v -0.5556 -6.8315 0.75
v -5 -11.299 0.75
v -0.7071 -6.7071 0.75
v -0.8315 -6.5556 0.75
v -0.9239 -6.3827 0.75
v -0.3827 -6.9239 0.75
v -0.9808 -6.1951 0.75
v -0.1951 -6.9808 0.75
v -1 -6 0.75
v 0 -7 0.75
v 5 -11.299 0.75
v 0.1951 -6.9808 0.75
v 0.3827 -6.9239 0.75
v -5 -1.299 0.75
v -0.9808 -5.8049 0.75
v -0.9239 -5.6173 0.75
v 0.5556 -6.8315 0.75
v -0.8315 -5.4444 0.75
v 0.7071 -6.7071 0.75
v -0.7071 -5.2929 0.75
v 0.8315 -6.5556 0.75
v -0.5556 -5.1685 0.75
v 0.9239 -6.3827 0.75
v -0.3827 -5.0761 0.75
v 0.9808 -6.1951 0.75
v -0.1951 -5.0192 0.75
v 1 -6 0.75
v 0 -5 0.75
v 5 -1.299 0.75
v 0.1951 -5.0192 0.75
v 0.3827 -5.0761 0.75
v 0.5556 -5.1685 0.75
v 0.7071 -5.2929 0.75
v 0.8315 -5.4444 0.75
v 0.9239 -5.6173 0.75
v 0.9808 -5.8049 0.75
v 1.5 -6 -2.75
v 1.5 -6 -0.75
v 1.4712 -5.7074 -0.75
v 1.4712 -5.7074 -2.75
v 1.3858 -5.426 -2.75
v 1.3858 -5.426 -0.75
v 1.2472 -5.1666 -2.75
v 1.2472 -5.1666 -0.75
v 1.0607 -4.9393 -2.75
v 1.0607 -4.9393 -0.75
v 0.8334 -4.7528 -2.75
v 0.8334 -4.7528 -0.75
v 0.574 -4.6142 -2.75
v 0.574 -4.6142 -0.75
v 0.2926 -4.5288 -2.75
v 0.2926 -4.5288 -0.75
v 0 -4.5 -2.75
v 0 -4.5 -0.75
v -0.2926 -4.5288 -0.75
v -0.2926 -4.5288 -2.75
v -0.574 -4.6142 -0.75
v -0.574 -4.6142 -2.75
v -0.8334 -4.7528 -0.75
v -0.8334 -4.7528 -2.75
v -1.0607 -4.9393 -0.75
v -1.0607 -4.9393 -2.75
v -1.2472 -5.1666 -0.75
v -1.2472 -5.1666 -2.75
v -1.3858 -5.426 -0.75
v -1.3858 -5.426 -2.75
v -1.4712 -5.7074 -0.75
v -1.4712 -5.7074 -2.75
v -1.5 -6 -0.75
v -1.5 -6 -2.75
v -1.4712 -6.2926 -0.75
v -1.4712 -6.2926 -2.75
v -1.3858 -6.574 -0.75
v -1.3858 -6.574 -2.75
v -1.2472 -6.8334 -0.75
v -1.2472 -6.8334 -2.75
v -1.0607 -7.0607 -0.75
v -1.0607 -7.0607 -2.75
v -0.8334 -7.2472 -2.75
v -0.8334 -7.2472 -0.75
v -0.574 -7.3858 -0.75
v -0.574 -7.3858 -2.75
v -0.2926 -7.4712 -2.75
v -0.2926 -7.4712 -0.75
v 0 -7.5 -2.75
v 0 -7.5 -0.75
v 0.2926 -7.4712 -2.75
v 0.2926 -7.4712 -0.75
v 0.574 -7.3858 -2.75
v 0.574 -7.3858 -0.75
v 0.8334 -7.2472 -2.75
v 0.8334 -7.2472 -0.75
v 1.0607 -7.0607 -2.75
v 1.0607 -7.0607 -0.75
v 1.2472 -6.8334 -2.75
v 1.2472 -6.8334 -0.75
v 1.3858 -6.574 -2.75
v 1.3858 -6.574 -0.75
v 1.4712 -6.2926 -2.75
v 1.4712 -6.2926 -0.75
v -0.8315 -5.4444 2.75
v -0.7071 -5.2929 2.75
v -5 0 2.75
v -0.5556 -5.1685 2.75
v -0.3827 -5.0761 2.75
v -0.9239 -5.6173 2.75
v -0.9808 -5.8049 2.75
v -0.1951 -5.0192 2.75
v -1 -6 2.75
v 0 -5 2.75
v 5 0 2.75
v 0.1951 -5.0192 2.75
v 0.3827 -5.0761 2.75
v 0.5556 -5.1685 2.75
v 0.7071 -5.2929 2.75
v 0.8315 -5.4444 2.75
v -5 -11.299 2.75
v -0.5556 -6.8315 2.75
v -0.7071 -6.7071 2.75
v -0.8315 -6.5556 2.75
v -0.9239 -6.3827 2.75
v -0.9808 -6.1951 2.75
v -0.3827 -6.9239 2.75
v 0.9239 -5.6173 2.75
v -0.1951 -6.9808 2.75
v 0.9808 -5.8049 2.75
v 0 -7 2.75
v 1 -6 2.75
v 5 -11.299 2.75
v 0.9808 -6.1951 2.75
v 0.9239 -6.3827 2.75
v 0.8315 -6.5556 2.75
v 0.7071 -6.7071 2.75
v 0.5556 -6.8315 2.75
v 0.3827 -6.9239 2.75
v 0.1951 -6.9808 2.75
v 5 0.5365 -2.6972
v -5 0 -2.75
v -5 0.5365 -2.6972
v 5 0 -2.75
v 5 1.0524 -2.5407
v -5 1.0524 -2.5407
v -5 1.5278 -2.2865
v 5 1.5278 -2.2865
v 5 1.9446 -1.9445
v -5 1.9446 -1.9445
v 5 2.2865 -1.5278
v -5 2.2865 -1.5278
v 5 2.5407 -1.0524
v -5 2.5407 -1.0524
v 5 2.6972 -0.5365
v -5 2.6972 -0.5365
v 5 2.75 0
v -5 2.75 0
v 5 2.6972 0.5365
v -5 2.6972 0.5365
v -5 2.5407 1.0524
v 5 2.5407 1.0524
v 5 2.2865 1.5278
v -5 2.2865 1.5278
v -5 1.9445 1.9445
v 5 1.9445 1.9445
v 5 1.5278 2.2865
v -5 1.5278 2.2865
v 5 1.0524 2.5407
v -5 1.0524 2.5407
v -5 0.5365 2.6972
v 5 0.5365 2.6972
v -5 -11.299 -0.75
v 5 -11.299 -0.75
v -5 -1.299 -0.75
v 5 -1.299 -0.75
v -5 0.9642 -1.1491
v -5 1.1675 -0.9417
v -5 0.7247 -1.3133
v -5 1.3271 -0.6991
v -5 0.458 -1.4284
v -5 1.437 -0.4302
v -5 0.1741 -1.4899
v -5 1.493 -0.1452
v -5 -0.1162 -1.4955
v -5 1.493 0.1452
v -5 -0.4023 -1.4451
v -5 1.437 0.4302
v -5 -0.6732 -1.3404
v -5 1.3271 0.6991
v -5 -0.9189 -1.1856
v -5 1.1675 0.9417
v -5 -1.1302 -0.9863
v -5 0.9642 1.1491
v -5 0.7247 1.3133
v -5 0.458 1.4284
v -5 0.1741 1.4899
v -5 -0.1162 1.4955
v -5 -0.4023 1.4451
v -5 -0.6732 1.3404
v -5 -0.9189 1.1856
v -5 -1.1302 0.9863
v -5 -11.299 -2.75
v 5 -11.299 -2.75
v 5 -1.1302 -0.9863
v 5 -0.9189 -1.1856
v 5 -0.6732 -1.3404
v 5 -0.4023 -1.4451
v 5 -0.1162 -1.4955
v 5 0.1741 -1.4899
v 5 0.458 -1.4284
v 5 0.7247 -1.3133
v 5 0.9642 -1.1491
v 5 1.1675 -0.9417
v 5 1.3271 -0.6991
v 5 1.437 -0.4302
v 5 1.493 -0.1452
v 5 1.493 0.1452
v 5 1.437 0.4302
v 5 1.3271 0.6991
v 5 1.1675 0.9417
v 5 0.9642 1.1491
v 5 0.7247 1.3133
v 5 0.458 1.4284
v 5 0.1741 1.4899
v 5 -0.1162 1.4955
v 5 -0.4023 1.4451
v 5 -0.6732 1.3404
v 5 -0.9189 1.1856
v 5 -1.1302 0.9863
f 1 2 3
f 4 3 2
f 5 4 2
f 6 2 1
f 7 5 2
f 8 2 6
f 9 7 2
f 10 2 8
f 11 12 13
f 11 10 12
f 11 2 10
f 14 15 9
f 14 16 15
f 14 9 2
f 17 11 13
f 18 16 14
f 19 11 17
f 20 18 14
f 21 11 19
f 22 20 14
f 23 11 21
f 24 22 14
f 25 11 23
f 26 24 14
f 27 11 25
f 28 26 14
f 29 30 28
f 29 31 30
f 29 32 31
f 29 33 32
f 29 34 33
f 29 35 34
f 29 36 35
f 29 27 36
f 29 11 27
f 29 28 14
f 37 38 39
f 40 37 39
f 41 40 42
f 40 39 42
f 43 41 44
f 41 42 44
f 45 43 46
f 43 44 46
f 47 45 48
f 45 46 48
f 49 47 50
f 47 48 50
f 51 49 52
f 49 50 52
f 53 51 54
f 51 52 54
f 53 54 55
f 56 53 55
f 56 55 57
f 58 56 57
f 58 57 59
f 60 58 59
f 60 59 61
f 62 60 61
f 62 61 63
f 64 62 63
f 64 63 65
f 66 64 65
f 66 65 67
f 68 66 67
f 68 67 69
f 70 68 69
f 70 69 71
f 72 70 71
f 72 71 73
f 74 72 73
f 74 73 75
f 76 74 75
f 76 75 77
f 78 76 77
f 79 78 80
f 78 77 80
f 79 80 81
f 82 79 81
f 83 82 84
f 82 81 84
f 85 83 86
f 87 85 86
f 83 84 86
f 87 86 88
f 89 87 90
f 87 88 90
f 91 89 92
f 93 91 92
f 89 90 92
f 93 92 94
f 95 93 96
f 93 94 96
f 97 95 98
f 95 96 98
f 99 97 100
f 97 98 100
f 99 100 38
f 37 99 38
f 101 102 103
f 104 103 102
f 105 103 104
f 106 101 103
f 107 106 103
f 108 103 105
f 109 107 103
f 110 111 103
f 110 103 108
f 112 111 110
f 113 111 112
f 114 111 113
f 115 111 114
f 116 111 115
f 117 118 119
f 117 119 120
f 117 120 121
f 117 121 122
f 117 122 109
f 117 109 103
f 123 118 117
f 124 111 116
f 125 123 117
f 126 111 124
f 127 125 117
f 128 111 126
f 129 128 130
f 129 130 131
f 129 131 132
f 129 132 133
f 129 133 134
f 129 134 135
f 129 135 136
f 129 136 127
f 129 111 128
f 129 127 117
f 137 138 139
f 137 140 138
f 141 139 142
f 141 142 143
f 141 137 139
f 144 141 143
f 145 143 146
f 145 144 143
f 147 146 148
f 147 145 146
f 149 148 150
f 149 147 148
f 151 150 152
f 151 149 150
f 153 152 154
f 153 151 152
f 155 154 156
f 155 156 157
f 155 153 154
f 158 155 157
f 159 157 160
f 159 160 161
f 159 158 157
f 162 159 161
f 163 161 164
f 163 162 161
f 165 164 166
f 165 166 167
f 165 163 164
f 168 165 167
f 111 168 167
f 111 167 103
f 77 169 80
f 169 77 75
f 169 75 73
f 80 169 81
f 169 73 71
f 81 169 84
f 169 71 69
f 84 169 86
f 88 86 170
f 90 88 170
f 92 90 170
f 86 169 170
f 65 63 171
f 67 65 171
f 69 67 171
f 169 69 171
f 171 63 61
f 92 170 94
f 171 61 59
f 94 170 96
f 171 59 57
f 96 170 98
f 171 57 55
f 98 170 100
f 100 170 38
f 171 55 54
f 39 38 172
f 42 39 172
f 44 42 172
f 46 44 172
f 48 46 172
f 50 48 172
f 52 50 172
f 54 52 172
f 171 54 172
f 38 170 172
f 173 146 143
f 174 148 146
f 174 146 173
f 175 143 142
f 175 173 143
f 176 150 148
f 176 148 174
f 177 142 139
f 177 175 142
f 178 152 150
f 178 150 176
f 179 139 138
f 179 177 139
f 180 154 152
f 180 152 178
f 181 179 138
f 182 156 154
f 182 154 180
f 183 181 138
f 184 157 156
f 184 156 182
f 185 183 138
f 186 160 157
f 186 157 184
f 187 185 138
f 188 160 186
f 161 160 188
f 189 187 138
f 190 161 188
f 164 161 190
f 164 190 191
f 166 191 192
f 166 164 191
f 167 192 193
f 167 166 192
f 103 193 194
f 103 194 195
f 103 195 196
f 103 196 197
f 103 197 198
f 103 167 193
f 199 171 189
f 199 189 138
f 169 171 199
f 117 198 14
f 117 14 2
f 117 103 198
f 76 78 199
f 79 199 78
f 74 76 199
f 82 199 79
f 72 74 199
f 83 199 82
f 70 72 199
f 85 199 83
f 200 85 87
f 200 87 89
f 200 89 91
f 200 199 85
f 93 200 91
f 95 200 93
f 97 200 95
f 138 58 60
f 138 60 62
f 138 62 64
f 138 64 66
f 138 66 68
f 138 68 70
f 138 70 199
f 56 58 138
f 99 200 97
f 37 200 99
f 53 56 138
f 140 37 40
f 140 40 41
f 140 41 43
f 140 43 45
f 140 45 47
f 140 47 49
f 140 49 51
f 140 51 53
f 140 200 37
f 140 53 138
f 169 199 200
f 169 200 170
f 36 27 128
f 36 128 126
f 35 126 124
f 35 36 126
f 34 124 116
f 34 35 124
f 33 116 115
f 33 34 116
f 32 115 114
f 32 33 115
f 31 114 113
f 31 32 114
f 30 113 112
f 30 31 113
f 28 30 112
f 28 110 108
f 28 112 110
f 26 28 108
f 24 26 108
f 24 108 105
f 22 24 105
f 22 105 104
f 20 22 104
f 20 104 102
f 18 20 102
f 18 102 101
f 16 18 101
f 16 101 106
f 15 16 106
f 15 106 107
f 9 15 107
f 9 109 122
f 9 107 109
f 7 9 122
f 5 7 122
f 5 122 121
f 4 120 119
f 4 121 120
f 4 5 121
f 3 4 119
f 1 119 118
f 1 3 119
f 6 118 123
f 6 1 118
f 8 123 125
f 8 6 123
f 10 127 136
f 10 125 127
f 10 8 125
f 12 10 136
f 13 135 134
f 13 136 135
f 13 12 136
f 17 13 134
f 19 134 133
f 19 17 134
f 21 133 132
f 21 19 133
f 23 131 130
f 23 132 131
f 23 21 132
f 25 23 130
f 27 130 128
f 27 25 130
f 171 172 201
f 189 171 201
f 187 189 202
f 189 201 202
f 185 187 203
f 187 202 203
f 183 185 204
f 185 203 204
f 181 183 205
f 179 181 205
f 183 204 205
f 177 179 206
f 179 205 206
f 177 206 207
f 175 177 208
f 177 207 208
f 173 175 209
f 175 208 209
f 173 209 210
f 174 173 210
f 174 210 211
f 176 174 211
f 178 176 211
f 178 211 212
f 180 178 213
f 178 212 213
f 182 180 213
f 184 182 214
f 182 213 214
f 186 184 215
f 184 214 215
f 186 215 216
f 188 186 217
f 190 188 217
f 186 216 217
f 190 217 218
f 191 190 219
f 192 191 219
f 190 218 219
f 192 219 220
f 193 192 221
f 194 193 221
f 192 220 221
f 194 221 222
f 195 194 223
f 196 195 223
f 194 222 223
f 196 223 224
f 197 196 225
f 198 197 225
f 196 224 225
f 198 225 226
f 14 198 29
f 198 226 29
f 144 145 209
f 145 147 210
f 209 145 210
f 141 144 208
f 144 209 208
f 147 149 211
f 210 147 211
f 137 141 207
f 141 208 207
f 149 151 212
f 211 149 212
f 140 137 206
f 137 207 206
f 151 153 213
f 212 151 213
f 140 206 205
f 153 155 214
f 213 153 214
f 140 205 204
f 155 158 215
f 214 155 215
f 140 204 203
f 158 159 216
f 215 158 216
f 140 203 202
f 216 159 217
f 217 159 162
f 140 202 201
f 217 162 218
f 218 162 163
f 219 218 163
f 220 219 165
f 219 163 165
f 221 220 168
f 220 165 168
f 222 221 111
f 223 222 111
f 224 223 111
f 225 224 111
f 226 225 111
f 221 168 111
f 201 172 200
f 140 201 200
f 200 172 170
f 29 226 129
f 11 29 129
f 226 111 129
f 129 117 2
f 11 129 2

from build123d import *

# Parameters (mm, degrees)
PAD_DEPTH       = 5
SKETCH001_R     = 1.5
POCKET_DEPTH    = 2.751
SKETCH002_R     = 1
POCKET001_DEPTH = 5


with BuildPart() as part:
    # Sketch → Pad (new body, symmetric)
    with BuildSketch(Plane.YZ):
        with BuildLine():
            ThreePointArc((-1.299038, -0.75), (1.5, 0), (-1.299038, 0.75))
            Line((-11.299038, 0.75), (-1.299038, 0.75))
            Line((-11.299038, 2.75), (-11.299038, 0.75))
            Line((0, 2.75), (-11.299038, 2.75))
            ThreePointArc((1.2e-05, -2.75), (2.75, 6e-06), (0, 2.75))
            Line((-11.299038, -2.75), (1.2e-05, -2.75))
            Line((-11.299038, -2.75), (-11.299038, -0.75))
            Line((-11.299038, -0.75), (-1.299038, -0.75))
        make_face()
    extrude(amount=PAD_DEPTH, both=True)

    # Sketch001 → Pocket (cut, through all)
    with BuildSketch(Plane.XY):
        with Locations((0, -6)):
            Circle(SKETCH001_R)
    extrude(amount=-POCKET_DEPTH, mode=Mode.SUBTRACT)

    # Sketch002 → Pocket001 (cut)
    with BuildSketch(Plane.XY):
        with Locations((0, -6)):
            Circle(SKETCH002_R)
    extrude(amount=POCKET001_DEPTH, mode=Mode.SUBTRACT)


solid = part.part
